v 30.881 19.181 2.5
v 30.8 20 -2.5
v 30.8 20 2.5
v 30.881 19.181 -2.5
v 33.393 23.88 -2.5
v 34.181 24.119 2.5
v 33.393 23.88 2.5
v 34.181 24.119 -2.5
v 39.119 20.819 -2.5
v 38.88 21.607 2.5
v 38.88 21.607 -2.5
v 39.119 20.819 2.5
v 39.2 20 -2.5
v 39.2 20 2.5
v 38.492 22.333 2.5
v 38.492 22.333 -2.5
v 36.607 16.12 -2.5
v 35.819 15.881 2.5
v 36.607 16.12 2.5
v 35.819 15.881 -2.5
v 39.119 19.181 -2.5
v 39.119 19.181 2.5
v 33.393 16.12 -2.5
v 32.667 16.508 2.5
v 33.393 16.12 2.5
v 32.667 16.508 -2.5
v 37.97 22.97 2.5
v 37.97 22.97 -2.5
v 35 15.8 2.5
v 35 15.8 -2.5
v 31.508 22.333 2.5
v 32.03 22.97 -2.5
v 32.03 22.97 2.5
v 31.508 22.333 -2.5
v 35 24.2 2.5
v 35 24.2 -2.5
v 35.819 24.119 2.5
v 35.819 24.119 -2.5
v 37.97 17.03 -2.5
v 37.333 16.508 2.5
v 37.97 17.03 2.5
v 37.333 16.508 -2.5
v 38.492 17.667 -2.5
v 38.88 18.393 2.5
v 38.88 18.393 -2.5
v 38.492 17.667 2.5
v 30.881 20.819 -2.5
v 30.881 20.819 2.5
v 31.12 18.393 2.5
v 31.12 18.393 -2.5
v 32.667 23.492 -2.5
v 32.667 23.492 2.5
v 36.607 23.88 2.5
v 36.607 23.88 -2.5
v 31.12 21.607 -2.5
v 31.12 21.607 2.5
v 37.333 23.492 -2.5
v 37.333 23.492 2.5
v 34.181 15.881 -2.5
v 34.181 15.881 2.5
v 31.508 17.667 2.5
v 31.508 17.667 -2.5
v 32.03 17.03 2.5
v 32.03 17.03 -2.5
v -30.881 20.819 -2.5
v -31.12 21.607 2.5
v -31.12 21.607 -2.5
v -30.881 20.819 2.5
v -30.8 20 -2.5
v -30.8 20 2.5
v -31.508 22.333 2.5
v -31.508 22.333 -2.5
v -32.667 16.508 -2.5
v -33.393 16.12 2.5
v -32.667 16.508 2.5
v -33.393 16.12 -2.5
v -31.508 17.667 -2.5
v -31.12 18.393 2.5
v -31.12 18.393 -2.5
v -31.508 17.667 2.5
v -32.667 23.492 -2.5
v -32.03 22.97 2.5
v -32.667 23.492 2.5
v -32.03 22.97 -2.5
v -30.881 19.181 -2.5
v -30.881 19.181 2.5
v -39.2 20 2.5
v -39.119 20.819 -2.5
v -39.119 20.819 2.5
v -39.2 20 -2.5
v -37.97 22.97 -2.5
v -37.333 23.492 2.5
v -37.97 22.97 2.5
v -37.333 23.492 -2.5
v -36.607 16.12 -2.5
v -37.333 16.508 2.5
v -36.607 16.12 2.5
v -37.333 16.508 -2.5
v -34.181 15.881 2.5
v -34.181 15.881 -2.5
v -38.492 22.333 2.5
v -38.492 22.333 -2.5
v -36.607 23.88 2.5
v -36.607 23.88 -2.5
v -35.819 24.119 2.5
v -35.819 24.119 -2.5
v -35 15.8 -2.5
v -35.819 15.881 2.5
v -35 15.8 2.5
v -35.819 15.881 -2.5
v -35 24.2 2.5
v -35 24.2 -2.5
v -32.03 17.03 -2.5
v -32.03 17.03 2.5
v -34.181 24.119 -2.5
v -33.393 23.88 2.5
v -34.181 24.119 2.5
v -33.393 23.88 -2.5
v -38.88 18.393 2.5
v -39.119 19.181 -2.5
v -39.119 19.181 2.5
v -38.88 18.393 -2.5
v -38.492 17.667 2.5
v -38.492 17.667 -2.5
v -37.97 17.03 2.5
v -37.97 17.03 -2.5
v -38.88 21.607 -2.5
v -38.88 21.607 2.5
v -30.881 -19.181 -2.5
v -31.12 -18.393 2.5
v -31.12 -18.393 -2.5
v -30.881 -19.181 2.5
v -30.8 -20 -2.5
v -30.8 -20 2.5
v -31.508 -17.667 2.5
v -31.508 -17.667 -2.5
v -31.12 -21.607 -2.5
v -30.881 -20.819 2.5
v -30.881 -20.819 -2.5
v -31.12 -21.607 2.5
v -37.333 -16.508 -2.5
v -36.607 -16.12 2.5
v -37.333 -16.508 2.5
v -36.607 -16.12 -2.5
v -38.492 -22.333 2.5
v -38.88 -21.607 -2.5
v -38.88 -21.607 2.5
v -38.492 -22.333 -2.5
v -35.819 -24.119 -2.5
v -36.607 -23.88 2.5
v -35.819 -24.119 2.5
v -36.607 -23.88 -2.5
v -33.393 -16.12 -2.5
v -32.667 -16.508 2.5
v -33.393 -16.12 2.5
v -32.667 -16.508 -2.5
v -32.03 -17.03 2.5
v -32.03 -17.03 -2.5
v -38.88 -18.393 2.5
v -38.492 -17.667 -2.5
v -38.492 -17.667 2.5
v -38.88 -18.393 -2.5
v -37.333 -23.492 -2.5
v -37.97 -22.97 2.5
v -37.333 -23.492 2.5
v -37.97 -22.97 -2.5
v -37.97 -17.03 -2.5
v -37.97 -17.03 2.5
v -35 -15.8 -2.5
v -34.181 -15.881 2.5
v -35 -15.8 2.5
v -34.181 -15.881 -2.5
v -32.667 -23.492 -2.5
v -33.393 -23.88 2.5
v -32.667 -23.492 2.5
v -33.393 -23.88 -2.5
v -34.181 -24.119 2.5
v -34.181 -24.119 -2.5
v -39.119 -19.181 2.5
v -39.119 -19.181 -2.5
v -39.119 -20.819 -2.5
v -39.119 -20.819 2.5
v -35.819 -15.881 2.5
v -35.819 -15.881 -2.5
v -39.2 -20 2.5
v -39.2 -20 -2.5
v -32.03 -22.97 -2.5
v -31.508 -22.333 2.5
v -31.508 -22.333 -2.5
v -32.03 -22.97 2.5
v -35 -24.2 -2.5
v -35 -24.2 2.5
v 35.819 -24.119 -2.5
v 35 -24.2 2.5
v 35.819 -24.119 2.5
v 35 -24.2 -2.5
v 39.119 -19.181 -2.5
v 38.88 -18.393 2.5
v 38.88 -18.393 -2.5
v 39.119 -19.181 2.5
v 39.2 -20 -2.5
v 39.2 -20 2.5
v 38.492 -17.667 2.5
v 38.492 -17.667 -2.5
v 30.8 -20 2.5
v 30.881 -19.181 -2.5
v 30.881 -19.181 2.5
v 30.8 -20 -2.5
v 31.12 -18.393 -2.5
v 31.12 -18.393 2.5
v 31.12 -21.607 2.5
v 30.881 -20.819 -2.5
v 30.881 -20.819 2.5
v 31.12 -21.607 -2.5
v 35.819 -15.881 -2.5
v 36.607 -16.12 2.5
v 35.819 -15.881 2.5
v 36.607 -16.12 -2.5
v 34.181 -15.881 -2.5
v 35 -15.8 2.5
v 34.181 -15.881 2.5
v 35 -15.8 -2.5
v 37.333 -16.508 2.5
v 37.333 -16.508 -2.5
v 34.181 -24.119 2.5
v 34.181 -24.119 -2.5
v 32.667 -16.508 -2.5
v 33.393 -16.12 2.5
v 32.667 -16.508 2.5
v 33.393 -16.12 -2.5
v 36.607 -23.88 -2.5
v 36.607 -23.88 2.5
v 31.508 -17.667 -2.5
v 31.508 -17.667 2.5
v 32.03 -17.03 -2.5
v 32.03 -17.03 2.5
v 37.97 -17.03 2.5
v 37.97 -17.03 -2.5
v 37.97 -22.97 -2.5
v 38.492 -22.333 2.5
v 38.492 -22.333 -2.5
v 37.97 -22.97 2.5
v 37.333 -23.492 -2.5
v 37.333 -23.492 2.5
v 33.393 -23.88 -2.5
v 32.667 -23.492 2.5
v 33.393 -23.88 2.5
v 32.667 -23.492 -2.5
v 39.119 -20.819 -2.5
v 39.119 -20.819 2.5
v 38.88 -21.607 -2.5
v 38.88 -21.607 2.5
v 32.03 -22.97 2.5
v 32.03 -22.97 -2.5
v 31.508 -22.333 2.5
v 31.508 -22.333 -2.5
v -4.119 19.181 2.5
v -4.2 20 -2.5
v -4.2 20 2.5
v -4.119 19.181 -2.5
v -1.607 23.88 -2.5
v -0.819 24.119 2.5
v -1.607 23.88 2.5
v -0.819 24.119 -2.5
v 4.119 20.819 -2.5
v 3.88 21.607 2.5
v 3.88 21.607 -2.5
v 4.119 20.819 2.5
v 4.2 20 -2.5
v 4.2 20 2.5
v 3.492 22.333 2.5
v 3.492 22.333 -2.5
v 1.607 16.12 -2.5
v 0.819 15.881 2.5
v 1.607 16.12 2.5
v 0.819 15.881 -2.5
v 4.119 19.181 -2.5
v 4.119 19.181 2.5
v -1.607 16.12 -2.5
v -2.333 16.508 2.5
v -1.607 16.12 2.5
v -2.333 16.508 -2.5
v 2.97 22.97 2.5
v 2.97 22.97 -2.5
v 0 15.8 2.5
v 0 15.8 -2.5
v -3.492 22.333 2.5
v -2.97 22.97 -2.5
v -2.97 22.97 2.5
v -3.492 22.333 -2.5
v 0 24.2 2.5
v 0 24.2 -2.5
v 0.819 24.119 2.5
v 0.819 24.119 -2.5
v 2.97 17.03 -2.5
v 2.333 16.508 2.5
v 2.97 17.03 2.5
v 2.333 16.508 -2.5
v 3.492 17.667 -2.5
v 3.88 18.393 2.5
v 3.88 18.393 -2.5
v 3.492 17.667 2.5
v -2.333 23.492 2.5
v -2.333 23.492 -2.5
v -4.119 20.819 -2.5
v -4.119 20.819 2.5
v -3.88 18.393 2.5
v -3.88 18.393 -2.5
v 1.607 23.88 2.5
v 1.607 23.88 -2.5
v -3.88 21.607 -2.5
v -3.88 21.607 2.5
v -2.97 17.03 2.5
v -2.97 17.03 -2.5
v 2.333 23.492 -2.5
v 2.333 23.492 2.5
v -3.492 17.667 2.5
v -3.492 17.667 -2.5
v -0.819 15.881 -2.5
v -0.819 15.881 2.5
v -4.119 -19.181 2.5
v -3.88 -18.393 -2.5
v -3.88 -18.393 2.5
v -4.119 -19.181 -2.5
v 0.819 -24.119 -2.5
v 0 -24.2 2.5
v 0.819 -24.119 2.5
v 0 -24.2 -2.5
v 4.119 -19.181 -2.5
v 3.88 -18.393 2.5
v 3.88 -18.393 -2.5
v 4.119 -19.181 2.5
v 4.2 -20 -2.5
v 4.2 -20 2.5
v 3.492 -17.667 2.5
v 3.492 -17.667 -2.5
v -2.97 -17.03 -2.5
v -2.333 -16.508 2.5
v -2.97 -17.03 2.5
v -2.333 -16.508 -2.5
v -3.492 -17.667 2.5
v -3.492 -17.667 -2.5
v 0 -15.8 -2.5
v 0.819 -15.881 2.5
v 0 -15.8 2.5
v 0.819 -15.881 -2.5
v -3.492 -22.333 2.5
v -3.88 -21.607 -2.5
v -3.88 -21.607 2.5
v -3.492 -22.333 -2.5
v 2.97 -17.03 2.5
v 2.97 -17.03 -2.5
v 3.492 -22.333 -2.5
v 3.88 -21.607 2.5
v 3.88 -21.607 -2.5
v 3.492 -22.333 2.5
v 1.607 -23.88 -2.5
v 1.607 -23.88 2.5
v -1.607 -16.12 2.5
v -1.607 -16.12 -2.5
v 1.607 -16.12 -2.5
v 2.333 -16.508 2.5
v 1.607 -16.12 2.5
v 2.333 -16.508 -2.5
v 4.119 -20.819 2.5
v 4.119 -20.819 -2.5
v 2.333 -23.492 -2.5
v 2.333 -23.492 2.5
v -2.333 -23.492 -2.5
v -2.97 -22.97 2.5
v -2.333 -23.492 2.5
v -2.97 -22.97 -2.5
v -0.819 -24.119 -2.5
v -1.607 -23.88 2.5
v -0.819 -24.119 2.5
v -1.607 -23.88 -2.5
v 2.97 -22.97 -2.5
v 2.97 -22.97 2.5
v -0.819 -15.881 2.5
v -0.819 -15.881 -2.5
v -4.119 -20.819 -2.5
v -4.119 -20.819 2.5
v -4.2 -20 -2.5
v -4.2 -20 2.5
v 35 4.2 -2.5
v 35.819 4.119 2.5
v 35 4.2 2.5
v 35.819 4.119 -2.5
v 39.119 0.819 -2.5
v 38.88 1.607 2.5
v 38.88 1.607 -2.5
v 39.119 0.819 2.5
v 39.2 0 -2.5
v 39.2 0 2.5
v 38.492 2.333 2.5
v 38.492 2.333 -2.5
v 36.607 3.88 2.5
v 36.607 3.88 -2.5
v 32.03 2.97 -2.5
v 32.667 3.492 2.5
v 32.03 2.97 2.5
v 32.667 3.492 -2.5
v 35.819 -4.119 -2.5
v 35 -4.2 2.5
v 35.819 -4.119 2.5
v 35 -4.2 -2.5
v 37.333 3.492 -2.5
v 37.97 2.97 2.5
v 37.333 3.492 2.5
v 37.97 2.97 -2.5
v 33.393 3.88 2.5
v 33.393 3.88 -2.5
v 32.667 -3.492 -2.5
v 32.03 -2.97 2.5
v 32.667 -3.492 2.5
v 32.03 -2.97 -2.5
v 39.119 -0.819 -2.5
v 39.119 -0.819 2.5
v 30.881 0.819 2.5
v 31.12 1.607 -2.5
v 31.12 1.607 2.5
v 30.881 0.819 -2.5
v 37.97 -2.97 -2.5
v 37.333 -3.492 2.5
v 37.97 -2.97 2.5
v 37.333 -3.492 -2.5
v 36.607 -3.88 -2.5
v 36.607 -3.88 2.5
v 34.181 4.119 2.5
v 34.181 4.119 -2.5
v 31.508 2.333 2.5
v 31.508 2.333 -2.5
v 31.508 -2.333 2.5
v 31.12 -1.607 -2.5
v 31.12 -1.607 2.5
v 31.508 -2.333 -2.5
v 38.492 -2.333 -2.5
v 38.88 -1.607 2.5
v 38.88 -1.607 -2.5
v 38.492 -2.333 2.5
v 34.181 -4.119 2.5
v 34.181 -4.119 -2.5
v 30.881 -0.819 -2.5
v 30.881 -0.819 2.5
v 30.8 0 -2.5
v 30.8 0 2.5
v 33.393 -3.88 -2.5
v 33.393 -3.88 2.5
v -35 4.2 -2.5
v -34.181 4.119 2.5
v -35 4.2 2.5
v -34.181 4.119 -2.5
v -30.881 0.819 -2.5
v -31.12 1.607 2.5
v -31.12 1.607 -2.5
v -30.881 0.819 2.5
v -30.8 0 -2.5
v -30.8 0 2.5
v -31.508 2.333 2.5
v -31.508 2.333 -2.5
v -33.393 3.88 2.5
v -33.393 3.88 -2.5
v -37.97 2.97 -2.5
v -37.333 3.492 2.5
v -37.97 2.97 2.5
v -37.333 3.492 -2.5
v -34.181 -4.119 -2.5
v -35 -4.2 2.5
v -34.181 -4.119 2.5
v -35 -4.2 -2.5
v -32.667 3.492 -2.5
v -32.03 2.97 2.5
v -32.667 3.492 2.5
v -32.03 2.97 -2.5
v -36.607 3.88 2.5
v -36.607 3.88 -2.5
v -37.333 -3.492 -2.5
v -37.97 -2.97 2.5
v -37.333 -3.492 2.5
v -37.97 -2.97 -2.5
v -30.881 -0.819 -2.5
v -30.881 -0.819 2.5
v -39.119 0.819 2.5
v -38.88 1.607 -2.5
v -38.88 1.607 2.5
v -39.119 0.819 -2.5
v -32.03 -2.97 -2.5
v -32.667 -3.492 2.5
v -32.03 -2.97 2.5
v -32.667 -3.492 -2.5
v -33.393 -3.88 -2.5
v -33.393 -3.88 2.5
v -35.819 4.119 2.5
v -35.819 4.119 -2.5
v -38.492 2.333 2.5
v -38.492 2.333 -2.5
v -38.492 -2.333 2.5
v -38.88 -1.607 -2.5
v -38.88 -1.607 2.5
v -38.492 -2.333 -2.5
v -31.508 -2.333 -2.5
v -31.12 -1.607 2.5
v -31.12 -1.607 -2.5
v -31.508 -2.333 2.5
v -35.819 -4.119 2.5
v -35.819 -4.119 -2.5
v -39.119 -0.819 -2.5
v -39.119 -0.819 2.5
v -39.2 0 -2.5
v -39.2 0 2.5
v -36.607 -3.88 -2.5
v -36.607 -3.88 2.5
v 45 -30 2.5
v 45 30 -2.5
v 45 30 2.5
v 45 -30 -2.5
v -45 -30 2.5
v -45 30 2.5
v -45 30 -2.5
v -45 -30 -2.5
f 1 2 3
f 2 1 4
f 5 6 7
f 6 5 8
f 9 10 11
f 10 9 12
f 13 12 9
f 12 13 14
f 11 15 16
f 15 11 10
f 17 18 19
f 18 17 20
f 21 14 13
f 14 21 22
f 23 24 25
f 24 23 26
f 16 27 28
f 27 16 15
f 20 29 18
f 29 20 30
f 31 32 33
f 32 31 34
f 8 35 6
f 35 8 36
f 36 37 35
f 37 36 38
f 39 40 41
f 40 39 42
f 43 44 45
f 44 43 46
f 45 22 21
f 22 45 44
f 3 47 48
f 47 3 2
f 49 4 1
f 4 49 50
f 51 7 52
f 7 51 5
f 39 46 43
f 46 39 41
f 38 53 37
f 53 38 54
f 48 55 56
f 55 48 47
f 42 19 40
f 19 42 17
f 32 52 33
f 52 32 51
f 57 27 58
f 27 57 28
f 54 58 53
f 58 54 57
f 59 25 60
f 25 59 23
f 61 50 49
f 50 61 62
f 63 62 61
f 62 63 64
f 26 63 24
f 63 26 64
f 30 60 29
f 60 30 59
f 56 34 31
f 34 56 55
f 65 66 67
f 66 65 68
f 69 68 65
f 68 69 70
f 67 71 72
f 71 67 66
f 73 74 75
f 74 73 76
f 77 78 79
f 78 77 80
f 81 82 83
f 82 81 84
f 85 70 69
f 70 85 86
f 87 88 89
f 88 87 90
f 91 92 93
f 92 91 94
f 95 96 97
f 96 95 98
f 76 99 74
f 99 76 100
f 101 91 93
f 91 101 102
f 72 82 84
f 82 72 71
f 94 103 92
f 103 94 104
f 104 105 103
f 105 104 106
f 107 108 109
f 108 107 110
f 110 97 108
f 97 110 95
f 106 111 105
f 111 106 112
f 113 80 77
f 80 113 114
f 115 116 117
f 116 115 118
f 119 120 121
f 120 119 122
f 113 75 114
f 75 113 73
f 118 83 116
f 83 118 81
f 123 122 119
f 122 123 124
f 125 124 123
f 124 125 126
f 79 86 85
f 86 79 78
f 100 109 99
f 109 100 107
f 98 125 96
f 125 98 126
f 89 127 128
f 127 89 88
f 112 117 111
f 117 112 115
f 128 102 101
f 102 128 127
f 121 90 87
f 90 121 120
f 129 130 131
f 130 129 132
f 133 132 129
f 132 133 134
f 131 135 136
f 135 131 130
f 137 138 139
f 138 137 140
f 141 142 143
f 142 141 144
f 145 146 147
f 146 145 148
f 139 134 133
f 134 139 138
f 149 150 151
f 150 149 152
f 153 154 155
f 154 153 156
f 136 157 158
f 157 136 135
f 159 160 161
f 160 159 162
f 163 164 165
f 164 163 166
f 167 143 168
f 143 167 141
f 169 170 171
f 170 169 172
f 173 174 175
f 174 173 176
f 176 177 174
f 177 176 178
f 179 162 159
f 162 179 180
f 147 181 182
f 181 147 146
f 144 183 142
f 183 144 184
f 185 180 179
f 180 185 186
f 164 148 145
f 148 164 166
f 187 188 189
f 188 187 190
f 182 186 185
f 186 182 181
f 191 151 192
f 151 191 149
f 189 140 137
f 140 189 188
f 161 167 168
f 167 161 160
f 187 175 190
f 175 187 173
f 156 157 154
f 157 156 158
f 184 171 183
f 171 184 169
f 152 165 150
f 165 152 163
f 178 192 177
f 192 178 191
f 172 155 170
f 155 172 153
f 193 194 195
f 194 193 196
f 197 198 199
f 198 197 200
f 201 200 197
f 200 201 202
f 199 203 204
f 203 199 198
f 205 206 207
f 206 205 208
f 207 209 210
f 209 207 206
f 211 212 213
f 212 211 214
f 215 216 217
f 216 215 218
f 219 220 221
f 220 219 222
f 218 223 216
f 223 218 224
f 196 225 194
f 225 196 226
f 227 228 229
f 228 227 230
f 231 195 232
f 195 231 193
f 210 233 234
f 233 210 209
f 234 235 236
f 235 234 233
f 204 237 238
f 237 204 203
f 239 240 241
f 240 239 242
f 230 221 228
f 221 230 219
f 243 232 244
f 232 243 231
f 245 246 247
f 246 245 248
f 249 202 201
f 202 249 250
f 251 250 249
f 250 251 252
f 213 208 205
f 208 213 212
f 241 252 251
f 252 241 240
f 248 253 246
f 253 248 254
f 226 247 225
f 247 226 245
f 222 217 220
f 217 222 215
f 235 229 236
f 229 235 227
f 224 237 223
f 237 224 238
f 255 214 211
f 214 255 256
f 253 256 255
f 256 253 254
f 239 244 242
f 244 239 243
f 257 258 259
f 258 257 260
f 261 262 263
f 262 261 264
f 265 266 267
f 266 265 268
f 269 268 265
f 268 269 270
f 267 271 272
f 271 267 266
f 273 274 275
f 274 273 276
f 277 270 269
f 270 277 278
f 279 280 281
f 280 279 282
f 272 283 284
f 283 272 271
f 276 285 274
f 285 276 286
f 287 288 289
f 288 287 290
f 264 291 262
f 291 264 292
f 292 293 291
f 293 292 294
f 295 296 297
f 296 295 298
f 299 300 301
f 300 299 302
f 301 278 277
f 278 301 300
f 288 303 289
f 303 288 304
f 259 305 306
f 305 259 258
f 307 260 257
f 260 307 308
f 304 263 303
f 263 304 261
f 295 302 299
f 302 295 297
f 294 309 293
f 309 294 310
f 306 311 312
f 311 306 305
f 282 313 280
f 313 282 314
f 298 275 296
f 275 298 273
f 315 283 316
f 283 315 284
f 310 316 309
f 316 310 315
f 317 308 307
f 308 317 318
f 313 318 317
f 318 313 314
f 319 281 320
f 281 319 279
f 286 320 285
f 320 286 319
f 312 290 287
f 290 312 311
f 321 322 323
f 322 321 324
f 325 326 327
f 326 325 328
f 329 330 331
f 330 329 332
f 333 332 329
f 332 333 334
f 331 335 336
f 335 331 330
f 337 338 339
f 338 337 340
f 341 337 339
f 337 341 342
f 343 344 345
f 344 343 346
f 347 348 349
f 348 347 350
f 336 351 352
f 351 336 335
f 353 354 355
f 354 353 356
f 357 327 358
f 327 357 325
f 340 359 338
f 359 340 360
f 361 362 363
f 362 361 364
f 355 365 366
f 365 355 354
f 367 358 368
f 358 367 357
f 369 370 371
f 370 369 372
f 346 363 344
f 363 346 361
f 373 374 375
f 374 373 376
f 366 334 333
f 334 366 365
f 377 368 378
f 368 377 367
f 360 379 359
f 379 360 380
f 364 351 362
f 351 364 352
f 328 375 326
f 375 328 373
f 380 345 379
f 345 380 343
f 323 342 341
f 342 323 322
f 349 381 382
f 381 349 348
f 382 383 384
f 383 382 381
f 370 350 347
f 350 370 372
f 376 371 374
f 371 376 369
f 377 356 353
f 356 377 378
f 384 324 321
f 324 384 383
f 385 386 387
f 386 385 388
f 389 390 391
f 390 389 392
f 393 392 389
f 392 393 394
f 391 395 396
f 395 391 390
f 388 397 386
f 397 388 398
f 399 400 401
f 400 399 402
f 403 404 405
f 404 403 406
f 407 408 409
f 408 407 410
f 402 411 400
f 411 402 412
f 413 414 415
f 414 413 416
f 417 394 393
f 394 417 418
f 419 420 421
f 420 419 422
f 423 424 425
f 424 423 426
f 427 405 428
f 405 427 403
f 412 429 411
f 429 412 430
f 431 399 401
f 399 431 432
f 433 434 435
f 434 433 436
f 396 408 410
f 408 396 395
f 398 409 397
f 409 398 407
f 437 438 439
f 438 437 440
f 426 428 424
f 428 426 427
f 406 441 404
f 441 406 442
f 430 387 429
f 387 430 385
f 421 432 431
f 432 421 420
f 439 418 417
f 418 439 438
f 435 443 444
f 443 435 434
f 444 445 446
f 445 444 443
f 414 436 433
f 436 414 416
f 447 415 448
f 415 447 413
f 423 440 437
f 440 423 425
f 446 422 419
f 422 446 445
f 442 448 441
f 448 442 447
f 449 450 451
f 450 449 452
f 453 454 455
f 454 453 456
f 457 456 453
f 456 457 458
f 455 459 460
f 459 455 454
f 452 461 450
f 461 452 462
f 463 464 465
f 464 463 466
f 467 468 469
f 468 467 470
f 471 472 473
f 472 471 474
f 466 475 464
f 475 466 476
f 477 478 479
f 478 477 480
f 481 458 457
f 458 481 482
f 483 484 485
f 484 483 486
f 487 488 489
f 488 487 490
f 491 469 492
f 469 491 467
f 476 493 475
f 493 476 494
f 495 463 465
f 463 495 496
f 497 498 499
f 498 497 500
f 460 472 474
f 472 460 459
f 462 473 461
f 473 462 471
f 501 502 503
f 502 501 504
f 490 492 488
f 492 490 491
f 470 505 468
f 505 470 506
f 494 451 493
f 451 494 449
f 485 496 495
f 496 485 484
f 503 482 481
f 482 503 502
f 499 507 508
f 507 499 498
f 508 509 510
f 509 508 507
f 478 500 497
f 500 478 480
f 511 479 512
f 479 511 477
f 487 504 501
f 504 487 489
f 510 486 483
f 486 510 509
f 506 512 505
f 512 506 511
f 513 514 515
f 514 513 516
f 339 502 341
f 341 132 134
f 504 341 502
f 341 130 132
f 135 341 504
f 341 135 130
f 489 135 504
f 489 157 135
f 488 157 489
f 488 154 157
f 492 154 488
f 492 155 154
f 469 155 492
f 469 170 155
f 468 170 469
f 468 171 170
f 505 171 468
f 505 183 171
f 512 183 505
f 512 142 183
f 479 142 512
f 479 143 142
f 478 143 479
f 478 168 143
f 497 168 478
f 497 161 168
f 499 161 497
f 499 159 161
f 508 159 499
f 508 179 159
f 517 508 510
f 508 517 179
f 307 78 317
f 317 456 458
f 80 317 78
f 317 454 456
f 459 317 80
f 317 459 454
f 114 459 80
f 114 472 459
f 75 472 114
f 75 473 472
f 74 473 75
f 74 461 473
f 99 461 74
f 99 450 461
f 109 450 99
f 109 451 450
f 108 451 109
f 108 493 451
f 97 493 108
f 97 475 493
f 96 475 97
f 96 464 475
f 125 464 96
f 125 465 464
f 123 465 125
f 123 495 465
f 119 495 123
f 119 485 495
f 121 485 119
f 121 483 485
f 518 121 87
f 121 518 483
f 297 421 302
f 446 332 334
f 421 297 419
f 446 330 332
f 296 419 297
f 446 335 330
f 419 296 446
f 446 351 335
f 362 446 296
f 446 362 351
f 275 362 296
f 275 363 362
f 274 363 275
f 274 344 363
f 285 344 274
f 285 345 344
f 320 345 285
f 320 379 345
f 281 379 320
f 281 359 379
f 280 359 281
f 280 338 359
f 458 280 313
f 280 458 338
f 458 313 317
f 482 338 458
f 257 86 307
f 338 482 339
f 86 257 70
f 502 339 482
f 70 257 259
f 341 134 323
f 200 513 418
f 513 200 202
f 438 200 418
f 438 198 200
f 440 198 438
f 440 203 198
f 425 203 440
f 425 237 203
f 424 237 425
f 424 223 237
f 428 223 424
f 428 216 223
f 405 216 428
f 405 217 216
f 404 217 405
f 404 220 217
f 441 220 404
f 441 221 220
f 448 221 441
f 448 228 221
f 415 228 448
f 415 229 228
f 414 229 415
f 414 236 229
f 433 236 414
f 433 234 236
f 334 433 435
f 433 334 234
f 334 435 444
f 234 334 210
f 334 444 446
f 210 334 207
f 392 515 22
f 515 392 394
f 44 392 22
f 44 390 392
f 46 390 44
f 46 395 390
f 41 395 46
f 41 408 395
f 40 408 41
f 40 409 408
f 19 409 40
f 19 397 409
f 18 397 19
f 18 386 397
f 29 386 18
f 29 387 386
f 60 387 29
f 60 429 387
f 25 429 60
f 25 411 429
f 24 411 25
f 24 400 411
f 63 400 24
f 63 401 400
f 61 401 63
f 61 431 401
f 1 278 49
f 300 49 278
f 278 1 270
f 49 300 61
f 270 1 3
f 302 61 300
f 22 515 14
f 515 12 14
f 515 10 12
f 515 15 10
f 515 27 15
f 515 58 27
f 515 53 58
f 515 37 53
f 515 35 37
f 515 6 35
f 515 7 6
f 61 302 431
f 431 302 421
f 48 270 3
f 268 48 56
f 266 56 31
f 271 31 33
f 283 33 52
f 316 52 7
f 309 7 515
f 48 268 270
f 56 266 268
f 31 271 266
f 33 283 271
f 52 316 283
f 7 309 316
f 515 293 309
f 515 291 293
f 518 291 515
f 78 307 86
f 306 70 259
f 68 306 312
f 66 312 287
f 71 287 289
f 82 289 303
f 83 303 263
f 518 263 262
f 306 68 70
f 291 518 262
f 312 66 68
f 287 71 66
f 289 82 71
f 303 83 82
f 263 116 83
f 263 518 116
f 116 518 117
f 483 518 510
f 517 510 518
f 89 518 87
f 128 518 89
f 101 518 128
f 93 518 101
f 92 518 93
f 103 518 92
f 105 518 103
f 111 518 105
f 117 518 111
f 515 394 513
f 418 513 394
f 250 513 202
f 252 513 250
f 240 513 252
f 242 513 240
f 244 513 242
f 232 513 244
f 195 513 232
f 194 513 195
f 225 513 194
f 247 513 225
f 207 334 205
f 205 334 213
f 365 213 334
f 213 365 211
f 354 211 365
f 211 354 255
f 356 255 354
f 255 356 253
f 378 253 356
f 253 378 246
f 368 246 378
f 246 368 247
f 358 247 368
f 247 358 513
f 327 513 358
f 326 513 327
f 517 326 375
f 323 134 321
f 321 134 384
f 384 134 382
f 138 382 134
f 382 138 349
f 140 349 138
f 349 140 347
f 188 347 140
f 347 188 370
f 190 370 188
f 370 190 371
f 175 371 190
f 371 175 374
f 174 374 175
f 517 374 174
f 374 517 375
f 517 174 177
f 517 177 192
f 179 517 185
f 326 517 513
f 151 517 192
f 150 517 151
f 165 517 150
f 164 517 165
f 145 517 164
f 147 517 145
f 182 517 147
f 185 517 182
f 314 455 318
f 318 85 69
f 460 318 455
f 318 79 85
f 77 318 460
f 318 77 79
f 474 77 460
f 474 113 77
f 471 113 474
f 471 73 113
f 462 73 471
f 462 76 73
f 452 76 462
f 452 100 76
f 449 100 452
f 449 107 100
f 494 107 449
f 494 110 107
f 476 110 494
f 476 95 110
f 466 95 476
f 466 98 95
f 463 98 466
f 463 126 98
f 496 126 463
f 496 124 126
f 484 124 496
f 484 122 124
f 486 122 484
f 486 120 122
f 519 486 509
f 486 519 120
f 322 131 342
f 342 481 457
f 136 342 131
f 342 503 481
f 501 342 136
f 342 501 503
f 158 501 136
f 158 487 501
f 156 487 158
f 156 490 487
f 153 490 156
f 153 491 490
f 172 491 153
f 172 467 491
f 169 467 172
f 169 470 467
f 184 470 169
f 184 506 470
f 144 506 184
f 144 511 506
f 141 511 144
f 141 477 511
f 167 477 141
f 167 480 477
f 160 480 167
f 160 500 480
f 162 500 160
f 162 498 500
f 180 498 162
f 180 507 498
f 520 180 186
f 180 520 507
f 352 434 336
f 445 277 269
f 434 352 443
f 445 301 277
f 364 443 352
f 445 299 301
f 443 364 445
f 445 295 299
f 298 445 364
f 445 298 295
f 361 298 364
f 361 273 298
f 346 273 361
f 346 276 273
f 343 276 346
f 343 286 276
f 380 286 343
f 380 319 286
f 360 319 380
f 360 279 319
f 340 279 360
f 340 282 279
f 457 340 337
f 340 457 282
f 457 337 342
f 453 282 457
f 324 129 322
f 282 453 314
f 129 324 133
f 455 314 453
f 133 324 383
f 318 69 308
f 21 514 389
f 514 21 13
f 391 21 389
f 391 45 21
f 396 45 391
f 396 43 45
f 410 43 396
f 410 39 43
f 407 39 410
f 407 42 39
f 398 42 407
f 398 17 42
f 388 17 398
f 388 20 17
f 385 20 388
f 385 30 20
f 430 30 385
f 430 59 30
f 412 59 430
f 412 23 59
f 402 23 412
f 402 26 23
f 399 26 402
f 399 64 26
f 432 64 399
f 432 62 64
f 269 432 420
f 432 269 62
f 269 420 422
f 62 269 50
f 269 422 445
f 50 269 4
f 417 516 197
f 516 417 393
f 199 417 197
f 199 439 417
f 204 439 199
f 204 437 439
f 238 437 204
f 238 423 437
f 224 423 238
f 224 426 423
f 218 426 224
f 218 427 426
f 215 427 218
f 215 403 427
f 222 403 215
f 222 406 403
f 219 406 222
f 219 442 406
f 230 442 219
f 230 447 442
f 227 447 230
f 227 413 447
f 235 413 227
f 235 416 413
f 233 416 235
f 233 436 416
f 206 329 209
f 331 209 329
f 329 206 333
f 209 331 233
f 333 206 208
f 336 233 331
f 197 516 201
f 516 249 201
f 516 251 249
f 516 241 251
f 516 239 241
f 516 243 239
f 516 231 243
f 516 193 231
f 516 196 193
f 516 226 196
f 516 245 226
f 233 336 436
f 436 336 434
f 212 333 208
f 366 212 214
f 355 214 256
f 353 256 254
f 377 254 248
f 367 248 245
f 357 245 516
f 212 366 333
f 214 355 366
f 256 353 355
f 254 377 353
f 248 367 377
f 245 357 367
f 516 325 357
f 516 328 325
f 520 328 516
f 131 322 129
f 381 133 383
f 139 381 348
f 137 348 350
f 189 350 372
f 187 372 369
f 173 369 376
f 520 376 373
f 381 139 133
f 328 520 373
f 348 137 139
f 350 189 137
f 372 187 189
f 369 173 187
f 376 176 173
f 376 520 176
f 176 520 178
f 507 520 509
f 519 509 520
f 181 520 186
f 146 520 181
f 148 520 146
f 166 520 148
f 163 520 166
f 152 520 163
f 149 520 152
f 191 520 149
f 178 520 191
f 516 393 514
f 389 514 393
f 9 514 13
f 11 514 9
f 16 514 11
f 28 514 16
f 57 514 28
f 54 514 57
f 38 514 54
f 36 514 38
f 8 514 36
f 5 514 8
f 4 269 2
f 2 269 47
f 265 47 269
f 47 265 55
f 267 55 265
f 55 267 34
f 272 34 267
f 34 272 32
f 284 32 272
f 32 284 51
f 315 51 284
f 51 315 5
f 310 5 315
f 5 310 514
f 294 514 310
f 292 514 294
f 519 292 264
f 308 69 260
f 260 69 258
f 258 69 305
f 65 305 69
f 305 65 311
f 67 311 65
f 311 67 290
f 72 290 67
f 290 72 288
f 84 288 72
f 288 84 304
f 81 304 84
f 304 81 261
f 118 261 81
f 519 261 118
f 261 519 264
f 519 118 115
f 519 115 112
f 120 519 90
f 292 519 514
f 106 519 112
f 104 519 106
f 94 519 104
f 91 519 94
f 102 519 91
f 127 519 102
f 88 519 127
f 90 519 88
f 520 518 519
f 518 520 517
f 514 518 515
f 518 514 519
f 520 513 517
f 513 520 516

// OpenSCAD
$fn = 32;

// ----------------------------------------------------------------------
// Corner plate 90 x 60 x 5
// 8 holes, centres taken from the edge offset
// ----------------------------------------------------------------------

// --- parameters (mm) ---
plate = [90, 60, 5];  // overall size (x, y, z)
seat_tol = 0.05;      // tolerance at the seating features
free_tol = 0.3;       // general tolerance on the free sizes
holes = 8;            // number of holes the drawing asks for
hole_d = 8.4;         // hole diameter
edge = 10;            // hole centre offset from the plate edge

// --- derived feature positions (mm) ---
corner_x = plate[0] / 2 - edge;  // = 35   corner hole X
corner_y = plate[1] / 2 - edge;  // = 20   corner hole Y
feature_centers = [
  [corner_x, corner_y],
  [-corner_x, corner_y],
  [-corner_x, -corner_y],
  [corner_x, -corner_y],
  [0, corner_y],
  [0, -corner_y],
  [corner_x, 0],
  [-corner_x, 0]
];   // hole centres the loop below drills

// plate outline, every hole drilled through with the same cutters
difference() {
  cube(plate, center = true);
  for (centre = feature_centers)
    translate([centre[0], centre[1], 0])
      cylinder(d = hole_d, h = plate[2] + 2, center = true);
}
